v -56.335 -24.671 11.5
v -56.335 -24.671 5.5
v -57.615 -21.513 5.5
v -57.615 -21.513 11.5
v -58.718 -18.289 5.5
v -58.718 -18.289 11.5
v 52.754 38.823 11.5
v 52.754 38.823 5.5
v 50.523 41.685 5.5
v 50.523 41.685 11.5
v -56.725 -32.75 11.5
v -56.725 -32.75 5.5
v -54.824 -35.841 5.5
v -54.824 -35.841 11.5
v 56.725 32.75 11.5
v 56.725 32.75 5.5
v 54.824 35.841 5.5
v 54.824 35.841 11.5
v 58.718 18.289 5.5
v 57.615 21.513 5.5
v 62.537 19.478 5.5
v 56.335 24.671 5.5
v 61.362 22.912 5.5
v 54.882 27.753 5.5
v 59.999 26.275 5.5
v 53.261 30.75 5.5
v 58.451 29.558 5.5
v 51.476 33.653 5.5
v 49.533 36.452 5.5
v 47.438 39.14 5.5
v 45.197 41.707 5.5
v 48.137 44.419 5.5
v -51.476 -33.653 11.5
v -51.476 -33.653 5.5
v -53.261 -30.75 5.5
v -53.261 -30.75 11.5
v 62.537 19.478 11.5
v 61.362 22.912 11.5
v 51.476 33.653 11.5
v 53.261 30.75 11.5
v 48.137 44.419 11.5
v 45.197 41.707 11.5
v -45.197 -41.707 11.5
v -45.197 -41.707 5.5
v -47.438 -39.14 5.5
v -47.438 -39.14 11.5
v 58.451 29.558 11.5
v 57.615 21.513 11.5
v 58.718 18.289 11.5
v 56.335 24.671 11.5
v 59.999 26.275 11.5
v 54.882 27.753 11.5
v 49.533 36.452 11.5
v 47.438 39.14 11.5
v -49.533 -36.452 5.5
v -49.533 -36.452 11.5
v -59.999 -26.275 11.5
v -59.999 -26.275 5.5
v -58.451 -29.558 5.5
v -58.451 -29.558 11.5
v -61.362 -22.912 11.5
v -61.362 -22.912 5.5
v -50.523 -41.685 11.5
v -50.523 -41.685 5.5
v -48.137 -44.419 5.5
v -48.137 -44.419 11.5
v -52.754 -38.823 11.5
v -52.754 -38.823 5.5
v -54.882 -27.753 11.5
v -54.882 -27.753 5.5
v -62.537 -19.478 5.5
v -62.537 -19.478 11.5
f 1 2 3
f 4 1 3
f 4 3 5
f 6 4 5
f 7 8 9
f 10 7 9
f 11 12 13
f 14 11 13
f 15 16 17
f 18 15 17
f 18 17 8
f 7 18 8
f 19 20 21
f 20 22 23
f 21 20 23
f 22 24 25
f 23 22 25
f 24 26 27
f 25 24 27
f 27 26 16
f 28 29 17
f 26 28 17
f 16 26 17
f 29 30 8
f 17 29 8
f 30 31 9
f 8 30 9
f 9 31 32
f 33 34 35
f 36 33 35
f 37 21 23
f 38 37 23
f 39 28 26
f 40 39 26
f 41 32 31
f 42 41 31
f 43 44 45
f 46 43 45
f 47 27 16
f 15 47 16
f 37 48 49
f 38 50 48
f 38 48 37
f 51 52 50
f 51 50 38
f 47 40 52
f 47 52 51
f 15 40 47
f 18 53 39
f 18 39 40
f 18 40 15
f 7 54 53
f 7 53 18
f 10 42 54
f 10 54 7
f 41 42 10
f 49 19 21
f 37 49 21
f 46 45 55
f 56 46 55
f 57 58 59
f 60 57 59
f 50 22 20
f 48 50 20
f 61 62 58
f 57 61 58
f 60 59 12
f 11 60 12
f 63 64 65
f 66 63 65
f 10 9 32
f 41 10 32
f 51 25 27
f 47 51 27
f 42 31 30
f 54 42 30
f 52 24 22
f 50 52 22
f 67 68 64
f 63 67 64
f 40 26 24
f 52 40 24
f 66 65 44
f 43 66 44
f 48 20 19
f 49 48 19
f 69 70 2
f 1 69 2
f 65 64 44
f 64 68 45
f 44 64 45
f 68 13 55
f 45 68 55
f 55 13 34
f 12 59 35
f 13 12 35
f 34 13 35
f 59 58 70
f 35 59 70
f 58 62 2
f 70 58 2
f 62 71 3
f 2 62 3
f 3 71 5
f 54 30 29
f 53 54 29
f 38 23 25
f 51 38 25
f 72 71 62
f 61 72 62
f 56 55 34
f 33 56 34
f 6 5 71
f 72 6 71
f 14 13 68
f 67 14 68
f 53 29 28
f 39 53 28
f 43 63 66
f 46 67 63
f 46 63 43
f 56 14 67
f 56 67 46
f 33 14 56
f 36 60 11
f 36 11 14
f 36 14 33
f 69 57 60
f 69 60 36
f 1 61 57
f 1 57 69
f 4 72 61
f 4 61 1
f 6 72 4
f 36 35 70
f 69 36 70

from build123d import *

# Parameters (mm, degrees)
EXTRUDE_START     = 5.5
EXTRUDE_1_DEPTH   = 6
EXTRUDE_1_2_DEPTH = 6


with BuildPart() as part:
    # 草圖1 → 填料-伸長1 (new body)
    with BuildSketch(Plane.XY.offset(EXTRUDE_START)):
        Polygon((62.536832367, 19.478054252), (61.3620314, 22.911811417), (59.998852171, 26.275230507), (58.451479569, 29.557985997), (56.724663948, 32.75), (54.823706543, 35.841473197), (52.754443194, 38.822914925), (50.523226434, 41.685172312), (48.136905982, 44.419458376), (45.197247602, 41.706819697), (47.43783856, 39.139512934), (49.532797809, 36.452049891), (51.475693929, 33.65268094), (53.260562333, 30.75), (54.881923565, 27.75291815), (56.33480013, 24.670636277), (57.614731773, 21.512616827), (58.717789169, 18.288554756), align=None)
    extrude(amount=EXTRUDE_1_DEPTH)


with BuildPart() as body_2:
    # 草圖1 → Extrude 1 2 (new body)
    with BuildSketch(Plane.XY.offset(EXTRUDE_START)):
        Polygon((-62.536832367, -19.478054252), (-61.3620314, -22.911811417), (-59.998852171, -26.275230507), (-58.451479569, -29.557985997), (-56.724663948, -32.75), (-54.823706543, -35.841473197), (-52.754443194, -38.822914925), (-50.523226434, -41.685172312), (-48.136905982, -44.419458376), (-45.197247602, -41.706819697), (-47.43783856, -39.139512934), (-49.532797809, -36.452049891), (-51.475693929, -33.65268094), (-53.260562333, -30.75), (-54.881923565, -27.75291815), (-56.33480013, -24.670636277), (-57.614731773, -21.512616827), (-58.717789169, -18.288554756), align=None)
    extrude(amount=EXTRUDE_1_2_DEPTH)


solid = Compound([part.part, body_2.part])
